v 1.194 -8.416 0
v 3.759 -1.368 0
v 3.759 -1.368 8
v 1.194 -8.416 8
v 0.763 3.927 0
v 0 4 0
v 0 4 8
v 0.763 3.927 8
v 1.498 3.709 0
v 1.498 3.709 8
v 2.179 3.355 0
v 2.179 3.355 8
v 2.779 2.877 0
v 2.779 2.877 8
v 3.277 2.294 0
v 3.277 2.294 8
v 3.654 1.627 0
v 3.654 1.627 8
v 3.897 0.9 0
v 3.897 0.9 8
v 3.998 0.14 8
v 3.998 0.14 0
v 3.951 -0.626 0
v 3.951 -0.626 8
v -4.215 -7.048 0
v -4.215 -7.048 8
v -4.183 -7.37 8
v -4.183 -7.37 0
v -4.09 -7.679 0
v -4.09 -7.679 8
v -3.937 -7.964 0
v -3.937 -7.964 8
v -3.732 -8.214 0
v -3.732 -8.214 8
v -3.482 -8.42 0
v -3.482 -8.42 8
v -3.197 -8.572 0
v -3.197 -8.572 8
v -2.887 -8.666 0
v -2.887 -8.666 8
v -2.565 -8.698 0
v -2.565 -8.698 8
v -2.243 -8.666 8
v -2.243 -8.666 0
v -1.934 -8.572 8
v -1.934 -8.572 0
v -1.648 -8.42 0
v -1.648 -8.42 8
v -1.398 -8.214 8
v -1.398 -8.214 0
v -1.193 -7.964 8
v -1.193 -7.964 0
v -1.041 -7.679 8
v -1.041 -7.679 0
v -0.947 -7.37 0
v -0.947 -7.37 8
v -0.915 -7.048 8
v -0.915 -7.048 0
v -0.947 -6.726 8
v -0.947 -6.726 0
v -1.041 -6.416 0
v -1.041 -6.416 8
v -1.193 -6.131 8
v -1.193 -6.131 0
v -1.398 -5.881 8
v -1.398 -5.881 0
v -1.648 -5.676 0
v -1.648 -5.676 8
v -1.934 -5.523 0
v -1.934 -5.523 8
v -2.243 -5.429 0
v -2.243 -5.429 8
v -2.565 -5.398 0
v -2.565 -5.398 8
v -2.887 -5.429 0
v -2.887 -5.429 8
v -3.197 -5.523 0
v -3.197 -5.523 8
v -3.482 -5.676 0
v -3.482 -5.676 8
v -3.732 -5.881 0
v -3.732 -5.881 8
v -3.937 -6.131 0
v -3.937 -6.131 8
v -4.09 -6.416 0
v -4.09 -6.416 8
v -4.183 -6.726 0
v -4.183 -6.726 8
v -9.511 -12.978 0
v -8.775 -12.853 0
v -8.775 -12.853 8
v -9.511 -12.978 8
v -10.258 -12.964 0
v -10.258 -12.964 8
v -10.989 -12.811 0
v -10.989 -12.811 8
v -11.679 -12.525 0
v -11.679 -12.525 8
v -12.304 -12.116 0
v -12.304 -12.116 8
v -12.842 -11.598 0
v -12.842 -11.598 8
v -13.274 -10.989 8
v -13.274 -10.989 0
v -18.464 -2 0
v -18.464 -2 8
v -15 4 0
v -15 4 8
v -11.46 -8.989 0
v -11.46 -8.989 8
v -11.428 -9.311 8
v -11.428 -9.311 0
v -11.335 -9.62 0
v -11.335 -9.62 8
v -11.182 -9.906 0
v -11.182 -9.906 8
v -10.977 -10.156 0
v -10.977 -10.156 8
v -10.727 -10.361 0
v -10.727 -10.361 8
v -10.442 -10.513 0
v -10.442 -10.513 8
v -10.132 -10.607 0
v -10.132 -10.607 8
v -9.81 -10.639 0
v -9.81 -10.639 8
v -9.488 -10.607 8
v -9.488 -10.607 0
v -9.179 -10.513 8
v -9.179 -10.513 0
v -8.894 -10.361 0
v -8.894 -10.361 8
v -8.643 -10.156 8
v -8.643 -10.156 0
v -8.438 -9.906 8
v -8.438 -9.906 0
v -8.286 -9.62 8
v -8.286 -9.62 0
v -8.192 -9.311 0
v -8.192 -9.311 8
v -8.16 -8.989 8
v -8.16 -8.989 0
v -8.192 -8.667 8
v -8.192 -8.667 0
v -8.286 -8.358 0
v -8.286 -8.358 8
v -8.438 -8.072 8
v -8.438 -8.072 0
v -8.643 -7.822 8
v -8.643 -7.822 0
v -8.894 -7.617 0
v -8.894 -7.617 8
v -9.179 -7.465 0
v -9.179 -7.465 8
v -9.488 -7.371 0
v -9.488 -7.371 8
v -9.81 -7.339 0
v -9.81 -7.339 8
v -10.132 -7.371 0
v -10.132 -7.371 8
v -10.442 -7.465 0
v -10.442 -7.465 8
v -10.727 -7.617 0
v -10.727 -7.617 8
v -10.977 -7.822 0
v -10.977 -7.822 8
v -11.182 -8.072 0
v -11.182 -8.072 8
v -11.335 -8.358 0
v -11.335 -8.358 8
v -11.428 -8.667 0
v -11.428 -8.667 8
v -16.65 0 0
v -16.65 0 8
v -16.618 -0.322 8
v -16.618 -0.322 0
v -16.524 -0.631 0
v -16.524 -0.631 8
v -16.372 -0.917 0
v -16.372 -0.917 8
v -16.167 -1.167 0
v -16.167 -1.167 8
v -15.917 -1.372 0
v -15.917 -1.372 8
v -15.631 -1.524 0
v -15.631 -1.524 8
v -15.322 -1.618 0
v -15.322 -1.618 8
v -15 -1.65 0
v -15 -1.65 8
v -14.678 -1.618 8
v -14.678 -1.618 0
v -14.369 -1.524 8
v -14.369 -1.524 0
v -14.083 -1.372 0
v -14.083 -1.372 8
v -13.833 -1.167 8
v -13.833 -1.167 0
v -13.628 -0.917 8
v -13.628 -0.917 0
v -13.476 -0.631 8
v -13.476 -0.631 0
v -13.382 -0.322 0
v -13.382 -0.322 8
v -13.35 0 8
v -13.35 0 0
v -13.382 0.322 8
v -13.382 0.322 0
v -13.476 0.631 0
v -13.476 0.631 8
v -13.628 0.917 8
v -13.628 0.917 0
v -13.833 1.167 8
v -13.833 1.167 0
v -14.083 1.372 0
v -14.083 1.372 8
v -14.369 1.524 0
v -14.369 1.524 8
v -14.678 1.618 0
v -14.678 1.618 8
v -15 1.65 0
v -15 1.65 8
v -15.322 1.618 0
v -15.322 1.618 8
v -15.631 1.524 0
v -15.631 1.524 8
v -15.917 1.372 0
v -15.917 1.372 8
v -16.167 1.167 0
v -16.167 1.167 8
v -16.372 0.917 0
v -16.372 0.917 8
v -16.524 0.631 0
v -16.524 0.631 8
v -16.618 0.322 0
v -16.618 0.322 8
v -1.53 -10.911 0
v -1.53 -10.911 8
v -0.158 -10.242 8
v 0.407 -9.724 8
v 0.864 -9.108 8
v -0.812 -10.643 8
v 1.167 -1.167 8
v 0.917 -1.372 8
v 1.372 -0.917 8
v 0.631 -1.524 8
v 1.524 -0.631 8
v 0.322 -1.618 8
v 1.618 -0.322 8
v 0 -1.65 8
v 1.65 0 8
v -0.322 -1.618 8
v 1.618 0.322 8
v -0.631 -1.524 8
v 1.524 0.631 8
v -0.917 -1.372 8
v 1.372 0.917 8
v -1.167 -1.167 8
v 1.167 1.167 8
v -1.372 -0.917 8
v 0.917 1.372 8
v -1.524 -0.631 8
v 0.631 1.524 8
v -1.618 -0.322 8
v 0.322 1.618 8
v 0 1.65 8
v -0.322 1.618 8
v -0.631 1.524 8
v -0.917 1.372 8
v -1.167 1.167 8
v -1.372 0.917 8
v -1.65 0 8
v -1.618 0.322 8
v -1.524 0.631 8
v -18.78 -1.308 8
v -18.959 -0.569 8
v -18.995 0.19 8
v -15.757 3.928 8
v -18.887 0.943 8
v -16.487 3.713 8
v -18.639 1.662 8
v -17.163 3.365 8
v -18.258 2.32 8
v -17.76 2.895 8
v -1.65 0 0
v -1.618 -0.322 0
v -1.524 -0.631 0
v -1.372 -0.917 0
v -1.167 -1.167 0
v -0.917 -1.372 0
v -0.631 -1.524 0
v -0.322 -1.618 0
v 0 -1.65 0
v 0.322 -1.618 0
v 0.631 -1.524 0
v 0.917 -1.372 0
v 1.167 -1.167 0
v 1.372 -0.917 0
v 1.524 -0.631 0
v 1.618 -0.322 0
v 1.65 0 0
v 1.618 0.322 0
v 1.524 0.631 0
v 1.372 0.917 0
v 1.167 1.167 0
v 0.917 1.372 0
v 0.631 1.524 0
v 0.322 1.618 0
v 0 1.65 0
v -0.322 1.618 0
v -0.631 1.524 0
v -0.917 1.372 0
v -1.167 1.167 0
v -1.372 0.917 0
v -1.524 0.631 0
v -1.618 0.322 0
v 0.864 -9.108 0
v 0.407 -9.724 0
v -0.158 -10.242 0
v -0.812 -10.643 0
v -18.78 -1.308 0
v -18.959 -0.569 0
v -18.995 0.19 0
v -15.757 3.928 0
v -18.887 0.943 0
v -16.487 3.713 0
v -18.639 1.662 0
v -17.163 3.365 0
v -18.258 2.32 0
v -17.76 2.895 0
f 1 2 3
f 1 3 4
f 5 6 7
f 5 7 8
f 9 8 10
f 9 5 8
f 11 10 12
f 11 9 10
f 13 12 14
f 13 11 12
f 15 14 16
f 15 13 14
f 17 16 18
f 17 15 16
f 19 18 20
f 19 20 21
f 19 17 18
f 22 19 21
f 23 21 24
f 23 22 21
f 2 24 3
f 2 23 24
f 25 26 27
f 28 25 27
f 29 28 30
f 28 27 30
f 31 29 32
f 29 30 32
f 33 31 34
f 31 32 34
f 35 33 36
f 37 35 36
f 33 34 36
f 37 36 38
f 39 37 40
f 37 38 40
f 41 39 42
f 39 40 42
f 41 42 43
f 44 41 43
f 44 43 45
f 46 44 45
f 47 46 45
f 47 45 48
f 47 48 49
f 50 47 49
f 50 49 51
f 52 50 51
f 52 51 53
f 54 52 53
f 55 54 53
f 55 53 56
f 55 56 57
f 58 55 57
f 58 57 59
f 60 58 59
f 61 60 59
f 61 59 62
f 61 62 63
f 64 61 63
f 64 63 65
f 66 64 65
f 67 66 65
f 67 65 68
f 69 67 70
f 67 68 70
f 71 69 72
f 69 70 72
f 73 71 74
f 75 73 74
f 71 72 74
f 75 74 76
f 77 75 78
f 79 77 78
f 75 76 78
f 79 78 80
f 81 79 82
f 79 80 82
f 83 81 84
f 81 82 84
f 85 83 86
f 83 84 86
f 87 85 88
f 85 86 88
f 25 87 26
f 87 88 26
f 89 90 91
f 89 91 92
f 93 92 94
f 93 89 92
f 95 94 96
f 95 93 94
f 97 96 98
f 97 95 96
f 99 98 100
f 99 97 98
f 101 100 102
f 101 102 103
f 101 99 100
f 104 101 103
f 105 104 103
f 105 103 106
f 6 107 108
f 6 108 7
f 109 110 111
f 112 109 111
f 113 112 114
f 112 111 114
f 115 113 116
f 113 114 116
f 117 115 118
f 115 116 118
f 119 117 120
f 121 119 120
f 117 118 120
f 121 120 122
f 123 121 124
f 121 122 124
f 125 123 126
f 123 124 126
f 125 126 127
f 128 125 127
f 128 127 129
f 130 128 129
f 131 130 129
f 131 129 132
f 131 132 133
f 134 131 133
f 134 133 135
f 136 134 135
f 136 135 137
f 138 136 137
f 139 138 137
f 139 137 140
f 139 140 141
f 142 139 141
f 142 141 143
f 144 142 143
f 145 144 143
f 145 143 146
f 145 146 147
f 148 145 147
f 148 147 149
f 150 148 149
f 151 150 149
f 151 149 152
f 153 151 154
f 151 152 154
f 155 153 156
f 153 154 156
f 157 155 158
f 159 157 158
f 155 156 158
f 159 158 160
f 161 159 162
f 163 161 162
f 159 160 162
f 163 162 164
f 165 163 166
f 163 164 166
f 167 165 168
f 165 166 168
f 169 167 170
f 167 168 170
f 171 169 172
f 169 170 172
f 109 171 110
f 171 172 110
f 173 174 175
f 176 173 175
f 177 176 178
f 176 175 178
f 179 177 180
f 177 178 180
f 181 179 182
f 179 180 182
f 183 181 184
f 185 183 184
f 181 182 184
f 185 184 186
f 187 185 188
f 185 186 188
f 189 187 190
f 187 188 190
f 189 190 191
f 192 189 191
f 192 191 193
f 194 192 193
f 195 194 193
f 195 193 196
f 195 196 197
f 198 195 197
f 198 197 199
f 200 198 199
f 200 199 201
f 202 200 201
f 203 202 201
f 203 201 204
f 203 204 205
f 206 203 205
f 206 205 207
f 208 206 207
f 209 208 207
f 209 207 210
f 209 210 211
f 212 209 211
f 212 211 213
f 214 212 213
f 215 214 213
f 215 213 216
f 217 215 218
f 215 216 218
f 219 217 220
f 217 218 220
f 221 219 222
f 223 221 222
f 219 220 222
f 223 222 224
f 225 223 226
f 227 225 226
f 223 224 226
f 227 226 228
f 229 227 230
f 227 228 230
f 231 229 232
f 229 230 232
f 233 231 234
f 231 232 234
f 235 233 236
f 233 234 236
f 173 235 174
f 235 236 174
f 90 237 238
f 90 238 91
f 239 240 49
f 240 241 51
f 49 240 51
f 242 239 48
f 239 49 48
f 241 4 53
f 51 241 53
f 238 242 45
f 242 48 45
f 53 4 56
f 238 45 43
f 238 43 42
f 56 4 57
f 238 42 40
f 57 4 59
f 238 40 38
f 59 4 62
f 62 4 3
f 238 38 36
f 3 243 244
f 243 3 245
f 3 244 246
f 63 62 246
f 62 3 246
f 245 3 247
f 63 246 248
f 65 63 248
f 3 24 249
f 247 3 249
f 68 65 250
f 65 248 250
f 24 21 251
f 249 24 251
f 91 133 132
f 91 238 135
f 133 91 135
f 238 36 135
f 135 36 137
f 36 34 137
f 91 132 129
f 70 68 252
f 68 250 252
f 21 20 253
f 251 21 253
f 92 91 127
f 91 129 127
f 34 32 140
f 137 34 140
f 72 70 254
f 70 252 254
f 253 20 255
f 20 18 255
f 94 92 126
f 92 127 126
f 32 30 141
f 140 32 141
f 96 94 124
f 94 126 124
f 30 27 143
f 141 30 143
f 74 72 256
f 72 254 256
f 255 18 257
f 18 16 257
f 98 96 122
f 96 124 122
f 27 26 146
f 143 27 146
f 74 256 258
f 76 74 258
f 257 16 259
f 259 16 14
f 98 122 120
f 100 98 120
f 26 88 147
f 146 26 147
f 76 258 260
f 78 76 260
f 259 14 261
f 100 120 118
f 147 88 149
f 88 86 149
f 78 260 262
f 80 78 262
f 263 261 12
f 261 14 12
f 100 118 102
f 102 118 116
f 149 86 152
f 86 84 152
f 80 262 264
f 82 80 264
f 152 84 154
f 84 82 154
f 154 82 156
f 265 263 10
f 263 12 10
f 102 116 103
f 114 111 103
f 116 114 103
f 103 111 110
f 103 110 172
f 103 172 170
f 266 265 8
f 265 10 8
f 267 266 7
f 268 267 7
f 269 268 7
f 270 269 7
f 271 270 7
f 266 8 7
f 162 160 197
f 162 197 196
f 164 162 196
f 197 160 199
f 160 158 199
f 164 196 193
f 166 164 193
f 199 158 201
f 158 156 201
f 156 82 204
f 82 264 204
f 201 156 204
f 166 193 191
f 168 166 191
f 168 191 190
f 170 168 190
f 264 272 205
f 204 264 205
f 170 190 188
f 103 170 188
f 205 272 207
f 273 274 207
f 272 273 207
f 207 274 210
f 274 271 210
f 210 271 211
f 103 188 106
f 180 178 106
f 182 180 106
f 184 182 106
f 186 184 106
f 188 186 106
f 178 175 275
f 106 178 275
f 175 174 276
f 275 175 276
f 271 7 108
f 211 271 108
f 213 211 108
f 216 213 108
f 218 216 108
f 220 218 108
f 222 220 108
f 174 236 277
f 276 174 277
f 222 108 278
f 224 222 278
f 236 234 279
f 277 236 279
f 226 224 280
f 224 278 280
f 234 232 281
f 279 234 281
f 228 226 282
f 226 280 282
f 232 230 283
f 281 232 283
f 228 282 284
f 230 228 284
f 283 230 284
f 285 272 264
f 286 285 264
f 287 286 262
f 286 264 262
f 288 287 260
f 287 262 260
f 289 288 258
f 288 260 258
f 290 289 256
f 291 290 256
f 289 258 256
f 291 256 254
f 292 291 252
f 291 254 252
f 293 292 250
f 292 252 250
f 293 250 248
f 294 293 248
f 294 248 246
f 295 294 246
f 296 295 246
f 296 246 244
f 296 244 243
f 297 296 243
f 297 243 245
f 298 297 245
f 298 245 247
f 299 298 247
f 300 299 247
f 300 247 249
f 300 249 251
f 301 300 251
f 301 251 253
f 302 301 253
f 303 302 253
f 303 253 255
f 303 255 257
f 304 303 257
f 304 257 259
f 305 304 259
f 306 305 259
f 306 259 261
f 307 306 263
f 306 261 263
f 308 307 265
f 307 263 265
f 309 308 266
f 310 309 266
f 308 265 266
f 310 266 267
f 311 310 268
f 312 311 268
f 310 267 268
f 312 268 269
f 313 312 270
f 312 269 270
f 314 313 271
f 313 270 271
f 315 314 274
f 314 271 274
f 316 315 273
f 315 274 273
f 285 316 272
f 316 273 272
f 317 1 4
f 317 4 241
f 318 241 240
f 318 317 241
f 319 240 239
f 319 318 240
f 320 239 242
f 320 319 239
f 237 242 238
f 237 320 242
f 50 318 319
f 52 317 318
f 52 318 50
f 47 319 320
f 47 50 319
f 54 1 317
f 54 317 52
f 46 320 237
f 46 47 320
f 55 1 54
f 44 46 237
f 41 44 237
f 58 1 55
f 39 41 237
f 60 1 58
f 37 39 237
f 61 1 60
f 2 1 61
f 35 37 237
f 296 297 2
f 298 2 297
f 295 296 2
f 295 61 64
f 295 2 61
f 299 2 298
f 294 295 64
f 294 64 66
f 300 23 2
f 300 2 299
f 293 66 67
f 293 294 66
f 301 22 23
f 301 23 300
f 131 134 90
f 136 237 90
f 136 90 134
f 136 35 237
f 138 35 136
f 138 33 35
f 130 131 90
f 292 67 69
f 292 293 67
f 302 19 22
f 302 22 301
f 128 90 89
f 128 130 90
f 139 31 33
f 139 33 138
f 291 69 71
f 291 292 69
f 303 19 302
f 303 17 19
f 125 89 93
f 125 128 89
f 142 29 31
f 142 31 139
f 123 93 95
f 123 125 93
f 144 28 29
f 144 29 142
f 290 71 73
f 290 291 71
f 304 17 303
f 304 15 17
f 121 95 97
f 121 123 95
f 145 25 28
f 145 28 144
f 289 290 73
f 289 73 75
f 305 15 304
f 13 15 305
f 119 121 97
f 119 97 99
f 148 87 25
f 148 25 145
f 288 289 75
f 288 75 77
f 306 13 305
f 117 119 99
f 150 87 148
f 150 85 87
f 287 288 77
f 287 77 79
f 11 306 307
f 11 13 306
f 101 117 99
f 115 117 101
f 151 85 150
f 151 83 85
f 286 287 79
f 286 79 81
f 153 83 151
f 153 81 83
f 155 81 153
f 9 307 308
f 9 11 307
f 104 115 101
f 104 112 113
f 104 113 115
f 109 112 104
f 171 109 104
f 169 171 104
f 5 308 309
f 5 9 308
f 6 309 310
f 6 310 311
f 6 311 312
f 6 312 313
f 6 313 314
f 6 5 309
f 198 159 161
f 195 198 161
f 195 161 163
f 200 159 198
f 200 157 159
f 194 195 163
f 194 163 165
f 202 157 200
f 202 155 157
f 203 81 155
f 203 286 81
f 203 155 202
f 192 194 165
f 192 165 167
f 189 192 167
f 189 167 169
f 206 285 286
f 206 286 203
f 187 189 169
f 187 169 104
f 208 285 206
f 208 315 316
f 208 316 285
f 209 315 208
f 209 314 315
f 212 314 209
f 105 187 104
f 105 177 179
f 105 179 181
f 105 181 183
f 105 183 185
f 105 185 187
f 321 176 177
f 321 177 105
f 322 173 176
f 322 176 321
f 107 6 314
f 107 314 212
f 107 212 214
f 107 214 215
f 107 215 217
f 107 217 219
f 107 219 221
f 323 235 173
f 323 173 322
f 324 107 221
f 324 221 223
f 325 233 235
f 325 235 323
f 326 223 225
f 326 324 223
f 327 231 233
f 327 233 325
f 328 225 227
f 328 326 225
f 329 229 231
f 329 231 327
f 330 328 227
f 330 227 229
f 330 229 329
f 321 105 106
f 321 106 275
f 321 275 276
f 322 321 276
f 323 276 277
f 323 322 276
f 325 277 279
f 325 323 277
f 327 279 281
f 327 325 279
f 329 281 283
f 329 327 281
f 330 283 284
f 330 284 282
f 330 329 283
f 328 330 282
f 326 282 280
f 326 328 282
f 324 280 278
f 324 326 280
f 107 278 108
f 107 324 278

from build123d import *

# Parameters (mm, degrees)
BOSS_EXTRU_1_DEPTH = 8
TROU_TARAUD_M41_D  = 3.3


with BuildPart() as part:
    # Esquisse1 → Boss.-Extru.1 (new body)
    with BuildSketch(Plane.XY):
        with BuildLine():
            Line((-15, 4), (0, 4))
            ThreePointArc((0, 4), (3.276608177, 2.294305745), (3.758770483, -1.368080573))
            Line((3.758770483, -1.368080573), (1.193619408, -8.415775229))
            ThreePointArc((1.193619408, -8.415775229), (0.137209756, -9.996804003), (-1.529874895, -10.911397961))
            Line((-1.529874895, -10.911397961), (-8.774922628, -12.85270265))
            ThreePointArc((-8.774922628, -12.85270265), (-11.340932538, -12.684517475), (-13.274300423, -10.988999345))
            Line((-13.274300423, -10.988999345), (-18.464101615, -2))
            ThreePointArc((-18.464101615, -2), (-18.464101615, 2), (-15, 4))
        make_face()
    extrude(amount=BOSS_EXTRU_1_DEPTH)

    # Trou taraudé M41 (through all)
    with Locations(Plane(origin=(0, 0, 0), x_dir=(1, 0, 0), z_dir=(0, 0, -1))):
        with Locations((-15, 0), (0, 0), (-2.565151075, 7.047694656), (-9.810198808, 8.988999345)):
            Hole(TROU_TARAUD_M41_D / 2)


solid = part.part
